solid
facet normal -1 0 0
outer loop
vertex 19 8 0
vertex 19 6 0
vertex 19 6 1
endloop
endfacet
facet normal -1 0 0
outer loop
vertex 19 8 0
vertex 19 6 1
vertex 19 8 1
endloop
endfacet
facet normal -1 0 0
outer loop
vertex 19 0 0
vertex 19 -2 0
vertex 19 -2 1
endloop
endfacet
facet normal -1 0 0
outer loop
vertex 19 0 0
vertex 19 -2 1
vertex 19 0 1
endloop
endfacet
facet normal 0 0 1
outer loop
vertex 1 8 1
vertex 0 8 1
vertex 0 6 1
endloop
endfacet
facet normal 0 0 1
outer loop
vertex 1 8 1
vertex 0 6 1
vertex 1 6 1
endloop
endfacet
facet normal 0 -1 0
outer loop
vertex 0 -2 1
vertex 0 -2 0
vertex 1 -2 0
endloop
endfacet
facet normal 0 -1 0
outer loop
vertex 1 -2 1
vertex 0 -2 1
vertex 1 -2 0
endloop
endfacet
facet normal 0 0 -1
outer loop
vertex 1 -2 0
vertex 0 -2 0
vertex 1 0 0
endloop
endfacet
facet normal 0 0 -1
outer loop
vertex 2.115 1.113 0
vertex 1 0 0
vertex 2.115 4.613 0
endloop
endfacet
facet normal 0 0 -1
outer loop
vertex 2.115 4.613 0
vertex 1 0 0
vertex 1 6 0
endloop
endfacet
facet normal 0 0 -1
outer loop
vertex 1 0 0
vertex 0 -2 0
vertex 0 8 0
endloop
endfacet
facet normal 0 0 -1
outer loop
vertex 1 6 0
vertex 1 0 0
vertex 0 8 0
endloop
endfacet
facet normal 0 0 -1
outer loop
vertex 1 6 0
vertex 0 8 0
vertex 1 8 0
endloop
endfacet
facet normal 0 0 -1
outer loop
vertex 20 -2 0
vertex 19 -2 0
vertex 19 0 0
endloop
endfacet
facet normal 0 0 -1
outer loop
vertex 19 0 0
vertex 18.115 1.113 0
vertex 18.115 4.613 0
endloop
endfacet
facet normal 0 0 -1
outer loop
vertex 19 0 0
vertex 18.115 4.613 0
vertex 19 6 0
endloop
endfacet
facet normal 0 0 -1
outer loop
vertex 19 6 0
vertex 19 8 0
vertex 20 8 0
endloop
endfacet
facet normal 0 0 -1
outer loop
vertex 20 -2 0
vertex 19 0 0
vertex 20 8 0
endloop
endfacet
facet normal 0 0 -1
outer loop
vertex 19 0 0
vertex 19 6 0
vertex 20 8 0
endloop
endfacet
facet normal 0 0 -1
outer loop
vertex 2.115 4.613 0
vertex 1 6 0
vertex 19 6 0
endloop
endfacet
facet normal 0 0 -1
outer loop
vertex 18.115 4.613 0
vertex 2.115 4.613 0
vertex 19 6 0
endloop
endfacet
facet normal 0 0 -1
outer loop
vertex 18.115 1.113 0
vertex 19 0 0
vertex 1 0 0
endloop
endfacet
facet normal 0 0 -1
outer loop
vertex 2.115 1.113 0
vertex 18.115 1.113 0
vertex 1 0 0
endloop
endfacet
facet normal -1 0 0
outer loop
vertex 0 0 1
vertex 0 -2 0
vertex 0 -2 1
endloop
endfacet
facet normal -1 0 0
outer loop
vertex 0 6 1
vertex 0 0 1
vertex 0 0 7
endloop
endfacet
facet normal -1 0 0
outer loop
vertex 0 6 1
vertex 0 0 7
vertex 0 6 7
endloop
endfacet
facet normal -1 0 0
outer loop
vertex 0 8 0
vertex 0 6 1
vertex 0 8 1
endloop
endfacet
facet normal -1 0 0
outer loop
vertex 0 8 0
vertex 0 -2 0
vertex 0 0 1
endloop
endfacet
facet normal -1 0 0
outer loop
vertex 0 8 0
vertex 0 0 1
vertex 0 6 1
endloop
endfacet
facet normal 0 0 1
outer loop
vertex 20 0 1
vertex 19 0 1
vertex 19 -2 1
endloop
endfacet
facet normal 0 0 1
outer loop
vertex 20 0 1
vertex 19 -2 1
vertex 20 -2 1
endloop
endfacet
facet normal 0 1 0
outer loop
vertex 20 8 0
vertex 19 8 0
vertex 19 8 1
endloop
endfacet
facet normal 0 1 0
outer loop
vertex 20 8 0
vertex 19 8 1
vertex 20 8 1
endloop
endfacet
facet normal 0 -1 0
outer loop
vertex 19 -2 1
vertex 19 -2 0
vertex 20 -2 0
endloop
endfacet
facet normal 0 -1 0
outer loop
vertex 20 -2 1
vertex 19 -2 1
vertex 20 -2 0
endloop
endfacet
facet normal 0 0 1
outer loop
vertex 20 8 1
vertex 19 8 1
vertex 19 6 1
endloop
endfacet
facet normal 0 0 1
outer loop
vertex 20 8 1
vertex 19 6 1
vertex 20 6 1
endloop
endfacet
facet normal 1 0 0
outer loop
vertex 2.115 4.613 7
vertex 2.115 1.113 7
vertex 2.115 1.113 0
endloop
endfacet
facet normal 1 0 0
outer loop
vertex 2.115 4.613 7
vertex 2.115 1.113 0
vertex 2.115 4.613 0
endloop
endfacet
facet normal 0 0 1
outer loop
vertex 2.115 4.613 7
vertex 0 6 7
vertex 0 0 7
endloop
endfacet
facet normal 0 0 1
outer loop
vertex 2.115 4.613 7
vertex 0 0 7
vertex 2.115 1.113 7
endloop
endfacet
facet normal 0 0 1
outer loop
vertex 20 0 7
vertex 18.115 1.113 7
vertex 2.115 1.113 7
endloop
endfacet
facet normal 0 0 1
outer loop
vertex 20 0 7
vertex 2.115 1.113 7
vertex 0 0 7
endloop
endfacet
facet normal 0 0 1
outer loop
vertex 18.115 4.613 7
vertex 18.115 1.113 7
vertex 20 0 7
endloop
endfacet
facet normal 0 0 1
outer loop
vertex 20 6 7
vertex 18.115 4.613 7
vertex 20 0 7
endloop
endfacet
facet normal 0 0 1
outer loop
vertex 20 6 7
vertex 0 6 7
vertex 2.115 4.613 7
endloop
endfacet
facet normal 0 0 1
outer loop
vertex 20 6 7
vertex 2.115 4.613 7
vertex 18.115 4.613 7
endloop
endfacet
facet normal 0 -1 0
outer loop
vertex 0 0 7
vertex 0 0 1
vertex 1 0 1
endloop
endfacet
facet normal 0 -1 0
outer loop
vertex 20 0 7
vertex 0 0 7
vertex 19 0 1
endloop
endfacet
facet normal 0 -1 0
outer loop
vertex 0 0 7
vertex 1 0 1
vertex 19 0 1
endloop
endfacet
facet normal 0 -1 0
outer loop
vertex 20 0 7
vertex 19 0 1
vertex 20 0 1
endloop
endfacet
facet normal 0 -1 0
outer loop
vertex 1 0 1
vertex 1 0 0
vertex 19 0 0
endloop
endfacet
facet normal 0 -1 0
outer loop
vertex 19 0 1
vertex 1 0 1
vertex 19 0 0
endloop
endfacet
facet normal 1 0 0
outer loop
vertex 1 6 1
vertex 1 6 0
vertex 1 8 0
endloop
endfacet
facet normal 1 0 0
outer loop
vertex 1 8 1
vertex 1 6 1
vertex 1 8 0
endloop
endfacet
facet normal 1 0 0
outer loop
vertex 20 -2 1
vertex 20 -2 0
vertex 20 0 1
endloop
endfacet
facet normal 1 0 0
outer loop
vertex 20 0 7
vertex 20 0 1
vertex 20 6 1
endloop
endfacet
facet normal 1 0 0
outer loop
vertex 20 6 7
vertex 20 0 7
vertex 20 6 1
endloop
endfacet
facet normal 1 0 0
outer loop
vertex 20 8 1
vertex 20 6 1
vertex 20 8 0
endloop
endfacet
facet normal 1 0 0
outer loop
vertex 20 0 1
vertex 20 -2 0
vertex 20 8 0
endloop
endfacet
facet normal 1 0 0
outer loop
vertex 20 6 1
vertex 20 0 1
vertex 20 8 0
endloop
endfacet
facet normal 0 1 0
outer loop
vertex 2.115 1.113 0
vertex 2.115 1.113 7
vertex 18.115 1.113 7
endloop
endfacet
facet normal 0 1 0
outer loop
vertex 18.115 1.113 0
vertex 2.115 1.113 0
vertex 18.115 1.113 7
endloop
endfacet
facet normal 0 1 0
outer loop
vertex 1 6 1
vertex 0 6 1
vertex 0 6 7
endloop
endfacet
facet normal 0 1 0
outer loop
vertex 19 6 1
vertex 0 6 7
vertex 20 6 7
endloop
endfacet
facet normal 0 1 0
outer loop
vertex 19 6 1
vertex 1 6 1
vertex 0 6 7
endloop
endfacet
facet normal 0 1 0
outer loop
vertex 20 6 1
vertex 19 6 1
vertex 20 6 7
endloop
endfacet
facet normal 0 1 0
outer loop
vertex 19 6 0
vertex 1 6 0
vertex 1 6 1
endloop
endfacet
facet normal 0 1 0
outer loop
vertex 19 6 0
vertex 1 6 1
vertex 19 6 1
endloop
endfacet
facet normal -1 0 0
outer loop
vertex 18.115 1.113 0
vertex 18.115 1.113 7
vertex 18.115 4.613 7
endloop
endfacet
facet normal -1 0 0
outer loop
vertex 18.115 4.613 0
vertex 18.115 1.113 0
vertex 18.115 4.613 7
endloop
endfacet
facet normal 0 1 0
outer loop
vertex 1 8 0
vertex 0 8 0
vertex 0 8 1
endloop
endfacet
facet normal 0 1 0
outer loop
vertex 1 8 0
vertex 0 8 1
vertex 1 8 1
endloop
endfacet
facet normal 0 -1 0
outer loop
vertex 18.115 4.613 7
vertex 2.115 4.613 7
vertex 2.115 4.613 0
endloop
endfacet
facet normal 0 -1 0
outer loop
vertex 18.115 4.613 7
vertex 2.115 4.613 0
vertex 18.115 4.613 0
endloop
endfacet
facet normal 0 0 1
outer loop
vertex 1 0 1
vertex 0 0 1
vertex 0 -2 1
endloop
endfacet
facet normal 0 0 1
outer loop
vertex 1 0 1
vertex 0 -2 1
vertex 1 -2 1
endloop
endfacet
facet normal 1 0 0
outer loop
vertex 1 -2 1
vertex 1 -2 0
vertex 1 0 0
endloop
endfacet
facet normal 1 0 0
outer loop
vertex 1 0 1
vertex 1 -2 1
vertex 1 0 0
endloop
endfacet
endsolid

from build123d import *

# Parameters (mm, degrees)
BOX001_W     = 1
BOX001_H     = 10
BOX001_DEPTH = 1
BOX002_W     = 1
BOX002_H     = 10
BOX002_DEPTH = 1
BOX_W        = 20
BOX_H        = 6
BOX_DEPTH    = 7
SKETCH_W     = 16
SKETCH_H     = 3.5
POCKET_DEPTH = 9


with BuildPart() as cube001:
    # Box001 → Box001 (new body)
    with BuildSketch(Plane(origin=(0, -2, 0), x_dir=(1, 0, 0), z_dir=(0, 0, 1))):
        with Locations((0.5, 5)):
            Rectangle(BOX001_W, BOX001_H)
    extrude(amount=BOX001_DEPTH)


with BuildPart() as cube002:
    # Box002 → Box002 (new body)
    with BuildSketch(Plane(origin=(19, -2, 0), x_dir=(1, 0, 0), z_dir=(0, 0, 1))):
        with Locations((0.5, 5)):
            Rectangle(BOX002_W, BOX002_H)
    extrude(amount=BOX002_DEPTH)


with BuildPart() as fusion:
    # Box → Box (new body)
    with BuildSketch(Plane.XY):
        with Locations((10, 3)):
            Rectangle(BOX_W, BOX_H)
    extrude(amount=BOX_DEPTH)

    # Sketch (on Face6 of BaseFeature) → Pocket (cut)
    with BuildSketch(Plane.XY.offset(7)):
        with Locations((10.11532, 2.863184)):
            Rectangle(SKETCH_W, SKETCH_H)
    extrude(amount=-POCKET_DEPTH, mode=Mode.SUBTRACT)

    # Fusion: union Cube001, Cube002
    add(cube001.part)
    add(cube002.part)


solid = fusion.part
